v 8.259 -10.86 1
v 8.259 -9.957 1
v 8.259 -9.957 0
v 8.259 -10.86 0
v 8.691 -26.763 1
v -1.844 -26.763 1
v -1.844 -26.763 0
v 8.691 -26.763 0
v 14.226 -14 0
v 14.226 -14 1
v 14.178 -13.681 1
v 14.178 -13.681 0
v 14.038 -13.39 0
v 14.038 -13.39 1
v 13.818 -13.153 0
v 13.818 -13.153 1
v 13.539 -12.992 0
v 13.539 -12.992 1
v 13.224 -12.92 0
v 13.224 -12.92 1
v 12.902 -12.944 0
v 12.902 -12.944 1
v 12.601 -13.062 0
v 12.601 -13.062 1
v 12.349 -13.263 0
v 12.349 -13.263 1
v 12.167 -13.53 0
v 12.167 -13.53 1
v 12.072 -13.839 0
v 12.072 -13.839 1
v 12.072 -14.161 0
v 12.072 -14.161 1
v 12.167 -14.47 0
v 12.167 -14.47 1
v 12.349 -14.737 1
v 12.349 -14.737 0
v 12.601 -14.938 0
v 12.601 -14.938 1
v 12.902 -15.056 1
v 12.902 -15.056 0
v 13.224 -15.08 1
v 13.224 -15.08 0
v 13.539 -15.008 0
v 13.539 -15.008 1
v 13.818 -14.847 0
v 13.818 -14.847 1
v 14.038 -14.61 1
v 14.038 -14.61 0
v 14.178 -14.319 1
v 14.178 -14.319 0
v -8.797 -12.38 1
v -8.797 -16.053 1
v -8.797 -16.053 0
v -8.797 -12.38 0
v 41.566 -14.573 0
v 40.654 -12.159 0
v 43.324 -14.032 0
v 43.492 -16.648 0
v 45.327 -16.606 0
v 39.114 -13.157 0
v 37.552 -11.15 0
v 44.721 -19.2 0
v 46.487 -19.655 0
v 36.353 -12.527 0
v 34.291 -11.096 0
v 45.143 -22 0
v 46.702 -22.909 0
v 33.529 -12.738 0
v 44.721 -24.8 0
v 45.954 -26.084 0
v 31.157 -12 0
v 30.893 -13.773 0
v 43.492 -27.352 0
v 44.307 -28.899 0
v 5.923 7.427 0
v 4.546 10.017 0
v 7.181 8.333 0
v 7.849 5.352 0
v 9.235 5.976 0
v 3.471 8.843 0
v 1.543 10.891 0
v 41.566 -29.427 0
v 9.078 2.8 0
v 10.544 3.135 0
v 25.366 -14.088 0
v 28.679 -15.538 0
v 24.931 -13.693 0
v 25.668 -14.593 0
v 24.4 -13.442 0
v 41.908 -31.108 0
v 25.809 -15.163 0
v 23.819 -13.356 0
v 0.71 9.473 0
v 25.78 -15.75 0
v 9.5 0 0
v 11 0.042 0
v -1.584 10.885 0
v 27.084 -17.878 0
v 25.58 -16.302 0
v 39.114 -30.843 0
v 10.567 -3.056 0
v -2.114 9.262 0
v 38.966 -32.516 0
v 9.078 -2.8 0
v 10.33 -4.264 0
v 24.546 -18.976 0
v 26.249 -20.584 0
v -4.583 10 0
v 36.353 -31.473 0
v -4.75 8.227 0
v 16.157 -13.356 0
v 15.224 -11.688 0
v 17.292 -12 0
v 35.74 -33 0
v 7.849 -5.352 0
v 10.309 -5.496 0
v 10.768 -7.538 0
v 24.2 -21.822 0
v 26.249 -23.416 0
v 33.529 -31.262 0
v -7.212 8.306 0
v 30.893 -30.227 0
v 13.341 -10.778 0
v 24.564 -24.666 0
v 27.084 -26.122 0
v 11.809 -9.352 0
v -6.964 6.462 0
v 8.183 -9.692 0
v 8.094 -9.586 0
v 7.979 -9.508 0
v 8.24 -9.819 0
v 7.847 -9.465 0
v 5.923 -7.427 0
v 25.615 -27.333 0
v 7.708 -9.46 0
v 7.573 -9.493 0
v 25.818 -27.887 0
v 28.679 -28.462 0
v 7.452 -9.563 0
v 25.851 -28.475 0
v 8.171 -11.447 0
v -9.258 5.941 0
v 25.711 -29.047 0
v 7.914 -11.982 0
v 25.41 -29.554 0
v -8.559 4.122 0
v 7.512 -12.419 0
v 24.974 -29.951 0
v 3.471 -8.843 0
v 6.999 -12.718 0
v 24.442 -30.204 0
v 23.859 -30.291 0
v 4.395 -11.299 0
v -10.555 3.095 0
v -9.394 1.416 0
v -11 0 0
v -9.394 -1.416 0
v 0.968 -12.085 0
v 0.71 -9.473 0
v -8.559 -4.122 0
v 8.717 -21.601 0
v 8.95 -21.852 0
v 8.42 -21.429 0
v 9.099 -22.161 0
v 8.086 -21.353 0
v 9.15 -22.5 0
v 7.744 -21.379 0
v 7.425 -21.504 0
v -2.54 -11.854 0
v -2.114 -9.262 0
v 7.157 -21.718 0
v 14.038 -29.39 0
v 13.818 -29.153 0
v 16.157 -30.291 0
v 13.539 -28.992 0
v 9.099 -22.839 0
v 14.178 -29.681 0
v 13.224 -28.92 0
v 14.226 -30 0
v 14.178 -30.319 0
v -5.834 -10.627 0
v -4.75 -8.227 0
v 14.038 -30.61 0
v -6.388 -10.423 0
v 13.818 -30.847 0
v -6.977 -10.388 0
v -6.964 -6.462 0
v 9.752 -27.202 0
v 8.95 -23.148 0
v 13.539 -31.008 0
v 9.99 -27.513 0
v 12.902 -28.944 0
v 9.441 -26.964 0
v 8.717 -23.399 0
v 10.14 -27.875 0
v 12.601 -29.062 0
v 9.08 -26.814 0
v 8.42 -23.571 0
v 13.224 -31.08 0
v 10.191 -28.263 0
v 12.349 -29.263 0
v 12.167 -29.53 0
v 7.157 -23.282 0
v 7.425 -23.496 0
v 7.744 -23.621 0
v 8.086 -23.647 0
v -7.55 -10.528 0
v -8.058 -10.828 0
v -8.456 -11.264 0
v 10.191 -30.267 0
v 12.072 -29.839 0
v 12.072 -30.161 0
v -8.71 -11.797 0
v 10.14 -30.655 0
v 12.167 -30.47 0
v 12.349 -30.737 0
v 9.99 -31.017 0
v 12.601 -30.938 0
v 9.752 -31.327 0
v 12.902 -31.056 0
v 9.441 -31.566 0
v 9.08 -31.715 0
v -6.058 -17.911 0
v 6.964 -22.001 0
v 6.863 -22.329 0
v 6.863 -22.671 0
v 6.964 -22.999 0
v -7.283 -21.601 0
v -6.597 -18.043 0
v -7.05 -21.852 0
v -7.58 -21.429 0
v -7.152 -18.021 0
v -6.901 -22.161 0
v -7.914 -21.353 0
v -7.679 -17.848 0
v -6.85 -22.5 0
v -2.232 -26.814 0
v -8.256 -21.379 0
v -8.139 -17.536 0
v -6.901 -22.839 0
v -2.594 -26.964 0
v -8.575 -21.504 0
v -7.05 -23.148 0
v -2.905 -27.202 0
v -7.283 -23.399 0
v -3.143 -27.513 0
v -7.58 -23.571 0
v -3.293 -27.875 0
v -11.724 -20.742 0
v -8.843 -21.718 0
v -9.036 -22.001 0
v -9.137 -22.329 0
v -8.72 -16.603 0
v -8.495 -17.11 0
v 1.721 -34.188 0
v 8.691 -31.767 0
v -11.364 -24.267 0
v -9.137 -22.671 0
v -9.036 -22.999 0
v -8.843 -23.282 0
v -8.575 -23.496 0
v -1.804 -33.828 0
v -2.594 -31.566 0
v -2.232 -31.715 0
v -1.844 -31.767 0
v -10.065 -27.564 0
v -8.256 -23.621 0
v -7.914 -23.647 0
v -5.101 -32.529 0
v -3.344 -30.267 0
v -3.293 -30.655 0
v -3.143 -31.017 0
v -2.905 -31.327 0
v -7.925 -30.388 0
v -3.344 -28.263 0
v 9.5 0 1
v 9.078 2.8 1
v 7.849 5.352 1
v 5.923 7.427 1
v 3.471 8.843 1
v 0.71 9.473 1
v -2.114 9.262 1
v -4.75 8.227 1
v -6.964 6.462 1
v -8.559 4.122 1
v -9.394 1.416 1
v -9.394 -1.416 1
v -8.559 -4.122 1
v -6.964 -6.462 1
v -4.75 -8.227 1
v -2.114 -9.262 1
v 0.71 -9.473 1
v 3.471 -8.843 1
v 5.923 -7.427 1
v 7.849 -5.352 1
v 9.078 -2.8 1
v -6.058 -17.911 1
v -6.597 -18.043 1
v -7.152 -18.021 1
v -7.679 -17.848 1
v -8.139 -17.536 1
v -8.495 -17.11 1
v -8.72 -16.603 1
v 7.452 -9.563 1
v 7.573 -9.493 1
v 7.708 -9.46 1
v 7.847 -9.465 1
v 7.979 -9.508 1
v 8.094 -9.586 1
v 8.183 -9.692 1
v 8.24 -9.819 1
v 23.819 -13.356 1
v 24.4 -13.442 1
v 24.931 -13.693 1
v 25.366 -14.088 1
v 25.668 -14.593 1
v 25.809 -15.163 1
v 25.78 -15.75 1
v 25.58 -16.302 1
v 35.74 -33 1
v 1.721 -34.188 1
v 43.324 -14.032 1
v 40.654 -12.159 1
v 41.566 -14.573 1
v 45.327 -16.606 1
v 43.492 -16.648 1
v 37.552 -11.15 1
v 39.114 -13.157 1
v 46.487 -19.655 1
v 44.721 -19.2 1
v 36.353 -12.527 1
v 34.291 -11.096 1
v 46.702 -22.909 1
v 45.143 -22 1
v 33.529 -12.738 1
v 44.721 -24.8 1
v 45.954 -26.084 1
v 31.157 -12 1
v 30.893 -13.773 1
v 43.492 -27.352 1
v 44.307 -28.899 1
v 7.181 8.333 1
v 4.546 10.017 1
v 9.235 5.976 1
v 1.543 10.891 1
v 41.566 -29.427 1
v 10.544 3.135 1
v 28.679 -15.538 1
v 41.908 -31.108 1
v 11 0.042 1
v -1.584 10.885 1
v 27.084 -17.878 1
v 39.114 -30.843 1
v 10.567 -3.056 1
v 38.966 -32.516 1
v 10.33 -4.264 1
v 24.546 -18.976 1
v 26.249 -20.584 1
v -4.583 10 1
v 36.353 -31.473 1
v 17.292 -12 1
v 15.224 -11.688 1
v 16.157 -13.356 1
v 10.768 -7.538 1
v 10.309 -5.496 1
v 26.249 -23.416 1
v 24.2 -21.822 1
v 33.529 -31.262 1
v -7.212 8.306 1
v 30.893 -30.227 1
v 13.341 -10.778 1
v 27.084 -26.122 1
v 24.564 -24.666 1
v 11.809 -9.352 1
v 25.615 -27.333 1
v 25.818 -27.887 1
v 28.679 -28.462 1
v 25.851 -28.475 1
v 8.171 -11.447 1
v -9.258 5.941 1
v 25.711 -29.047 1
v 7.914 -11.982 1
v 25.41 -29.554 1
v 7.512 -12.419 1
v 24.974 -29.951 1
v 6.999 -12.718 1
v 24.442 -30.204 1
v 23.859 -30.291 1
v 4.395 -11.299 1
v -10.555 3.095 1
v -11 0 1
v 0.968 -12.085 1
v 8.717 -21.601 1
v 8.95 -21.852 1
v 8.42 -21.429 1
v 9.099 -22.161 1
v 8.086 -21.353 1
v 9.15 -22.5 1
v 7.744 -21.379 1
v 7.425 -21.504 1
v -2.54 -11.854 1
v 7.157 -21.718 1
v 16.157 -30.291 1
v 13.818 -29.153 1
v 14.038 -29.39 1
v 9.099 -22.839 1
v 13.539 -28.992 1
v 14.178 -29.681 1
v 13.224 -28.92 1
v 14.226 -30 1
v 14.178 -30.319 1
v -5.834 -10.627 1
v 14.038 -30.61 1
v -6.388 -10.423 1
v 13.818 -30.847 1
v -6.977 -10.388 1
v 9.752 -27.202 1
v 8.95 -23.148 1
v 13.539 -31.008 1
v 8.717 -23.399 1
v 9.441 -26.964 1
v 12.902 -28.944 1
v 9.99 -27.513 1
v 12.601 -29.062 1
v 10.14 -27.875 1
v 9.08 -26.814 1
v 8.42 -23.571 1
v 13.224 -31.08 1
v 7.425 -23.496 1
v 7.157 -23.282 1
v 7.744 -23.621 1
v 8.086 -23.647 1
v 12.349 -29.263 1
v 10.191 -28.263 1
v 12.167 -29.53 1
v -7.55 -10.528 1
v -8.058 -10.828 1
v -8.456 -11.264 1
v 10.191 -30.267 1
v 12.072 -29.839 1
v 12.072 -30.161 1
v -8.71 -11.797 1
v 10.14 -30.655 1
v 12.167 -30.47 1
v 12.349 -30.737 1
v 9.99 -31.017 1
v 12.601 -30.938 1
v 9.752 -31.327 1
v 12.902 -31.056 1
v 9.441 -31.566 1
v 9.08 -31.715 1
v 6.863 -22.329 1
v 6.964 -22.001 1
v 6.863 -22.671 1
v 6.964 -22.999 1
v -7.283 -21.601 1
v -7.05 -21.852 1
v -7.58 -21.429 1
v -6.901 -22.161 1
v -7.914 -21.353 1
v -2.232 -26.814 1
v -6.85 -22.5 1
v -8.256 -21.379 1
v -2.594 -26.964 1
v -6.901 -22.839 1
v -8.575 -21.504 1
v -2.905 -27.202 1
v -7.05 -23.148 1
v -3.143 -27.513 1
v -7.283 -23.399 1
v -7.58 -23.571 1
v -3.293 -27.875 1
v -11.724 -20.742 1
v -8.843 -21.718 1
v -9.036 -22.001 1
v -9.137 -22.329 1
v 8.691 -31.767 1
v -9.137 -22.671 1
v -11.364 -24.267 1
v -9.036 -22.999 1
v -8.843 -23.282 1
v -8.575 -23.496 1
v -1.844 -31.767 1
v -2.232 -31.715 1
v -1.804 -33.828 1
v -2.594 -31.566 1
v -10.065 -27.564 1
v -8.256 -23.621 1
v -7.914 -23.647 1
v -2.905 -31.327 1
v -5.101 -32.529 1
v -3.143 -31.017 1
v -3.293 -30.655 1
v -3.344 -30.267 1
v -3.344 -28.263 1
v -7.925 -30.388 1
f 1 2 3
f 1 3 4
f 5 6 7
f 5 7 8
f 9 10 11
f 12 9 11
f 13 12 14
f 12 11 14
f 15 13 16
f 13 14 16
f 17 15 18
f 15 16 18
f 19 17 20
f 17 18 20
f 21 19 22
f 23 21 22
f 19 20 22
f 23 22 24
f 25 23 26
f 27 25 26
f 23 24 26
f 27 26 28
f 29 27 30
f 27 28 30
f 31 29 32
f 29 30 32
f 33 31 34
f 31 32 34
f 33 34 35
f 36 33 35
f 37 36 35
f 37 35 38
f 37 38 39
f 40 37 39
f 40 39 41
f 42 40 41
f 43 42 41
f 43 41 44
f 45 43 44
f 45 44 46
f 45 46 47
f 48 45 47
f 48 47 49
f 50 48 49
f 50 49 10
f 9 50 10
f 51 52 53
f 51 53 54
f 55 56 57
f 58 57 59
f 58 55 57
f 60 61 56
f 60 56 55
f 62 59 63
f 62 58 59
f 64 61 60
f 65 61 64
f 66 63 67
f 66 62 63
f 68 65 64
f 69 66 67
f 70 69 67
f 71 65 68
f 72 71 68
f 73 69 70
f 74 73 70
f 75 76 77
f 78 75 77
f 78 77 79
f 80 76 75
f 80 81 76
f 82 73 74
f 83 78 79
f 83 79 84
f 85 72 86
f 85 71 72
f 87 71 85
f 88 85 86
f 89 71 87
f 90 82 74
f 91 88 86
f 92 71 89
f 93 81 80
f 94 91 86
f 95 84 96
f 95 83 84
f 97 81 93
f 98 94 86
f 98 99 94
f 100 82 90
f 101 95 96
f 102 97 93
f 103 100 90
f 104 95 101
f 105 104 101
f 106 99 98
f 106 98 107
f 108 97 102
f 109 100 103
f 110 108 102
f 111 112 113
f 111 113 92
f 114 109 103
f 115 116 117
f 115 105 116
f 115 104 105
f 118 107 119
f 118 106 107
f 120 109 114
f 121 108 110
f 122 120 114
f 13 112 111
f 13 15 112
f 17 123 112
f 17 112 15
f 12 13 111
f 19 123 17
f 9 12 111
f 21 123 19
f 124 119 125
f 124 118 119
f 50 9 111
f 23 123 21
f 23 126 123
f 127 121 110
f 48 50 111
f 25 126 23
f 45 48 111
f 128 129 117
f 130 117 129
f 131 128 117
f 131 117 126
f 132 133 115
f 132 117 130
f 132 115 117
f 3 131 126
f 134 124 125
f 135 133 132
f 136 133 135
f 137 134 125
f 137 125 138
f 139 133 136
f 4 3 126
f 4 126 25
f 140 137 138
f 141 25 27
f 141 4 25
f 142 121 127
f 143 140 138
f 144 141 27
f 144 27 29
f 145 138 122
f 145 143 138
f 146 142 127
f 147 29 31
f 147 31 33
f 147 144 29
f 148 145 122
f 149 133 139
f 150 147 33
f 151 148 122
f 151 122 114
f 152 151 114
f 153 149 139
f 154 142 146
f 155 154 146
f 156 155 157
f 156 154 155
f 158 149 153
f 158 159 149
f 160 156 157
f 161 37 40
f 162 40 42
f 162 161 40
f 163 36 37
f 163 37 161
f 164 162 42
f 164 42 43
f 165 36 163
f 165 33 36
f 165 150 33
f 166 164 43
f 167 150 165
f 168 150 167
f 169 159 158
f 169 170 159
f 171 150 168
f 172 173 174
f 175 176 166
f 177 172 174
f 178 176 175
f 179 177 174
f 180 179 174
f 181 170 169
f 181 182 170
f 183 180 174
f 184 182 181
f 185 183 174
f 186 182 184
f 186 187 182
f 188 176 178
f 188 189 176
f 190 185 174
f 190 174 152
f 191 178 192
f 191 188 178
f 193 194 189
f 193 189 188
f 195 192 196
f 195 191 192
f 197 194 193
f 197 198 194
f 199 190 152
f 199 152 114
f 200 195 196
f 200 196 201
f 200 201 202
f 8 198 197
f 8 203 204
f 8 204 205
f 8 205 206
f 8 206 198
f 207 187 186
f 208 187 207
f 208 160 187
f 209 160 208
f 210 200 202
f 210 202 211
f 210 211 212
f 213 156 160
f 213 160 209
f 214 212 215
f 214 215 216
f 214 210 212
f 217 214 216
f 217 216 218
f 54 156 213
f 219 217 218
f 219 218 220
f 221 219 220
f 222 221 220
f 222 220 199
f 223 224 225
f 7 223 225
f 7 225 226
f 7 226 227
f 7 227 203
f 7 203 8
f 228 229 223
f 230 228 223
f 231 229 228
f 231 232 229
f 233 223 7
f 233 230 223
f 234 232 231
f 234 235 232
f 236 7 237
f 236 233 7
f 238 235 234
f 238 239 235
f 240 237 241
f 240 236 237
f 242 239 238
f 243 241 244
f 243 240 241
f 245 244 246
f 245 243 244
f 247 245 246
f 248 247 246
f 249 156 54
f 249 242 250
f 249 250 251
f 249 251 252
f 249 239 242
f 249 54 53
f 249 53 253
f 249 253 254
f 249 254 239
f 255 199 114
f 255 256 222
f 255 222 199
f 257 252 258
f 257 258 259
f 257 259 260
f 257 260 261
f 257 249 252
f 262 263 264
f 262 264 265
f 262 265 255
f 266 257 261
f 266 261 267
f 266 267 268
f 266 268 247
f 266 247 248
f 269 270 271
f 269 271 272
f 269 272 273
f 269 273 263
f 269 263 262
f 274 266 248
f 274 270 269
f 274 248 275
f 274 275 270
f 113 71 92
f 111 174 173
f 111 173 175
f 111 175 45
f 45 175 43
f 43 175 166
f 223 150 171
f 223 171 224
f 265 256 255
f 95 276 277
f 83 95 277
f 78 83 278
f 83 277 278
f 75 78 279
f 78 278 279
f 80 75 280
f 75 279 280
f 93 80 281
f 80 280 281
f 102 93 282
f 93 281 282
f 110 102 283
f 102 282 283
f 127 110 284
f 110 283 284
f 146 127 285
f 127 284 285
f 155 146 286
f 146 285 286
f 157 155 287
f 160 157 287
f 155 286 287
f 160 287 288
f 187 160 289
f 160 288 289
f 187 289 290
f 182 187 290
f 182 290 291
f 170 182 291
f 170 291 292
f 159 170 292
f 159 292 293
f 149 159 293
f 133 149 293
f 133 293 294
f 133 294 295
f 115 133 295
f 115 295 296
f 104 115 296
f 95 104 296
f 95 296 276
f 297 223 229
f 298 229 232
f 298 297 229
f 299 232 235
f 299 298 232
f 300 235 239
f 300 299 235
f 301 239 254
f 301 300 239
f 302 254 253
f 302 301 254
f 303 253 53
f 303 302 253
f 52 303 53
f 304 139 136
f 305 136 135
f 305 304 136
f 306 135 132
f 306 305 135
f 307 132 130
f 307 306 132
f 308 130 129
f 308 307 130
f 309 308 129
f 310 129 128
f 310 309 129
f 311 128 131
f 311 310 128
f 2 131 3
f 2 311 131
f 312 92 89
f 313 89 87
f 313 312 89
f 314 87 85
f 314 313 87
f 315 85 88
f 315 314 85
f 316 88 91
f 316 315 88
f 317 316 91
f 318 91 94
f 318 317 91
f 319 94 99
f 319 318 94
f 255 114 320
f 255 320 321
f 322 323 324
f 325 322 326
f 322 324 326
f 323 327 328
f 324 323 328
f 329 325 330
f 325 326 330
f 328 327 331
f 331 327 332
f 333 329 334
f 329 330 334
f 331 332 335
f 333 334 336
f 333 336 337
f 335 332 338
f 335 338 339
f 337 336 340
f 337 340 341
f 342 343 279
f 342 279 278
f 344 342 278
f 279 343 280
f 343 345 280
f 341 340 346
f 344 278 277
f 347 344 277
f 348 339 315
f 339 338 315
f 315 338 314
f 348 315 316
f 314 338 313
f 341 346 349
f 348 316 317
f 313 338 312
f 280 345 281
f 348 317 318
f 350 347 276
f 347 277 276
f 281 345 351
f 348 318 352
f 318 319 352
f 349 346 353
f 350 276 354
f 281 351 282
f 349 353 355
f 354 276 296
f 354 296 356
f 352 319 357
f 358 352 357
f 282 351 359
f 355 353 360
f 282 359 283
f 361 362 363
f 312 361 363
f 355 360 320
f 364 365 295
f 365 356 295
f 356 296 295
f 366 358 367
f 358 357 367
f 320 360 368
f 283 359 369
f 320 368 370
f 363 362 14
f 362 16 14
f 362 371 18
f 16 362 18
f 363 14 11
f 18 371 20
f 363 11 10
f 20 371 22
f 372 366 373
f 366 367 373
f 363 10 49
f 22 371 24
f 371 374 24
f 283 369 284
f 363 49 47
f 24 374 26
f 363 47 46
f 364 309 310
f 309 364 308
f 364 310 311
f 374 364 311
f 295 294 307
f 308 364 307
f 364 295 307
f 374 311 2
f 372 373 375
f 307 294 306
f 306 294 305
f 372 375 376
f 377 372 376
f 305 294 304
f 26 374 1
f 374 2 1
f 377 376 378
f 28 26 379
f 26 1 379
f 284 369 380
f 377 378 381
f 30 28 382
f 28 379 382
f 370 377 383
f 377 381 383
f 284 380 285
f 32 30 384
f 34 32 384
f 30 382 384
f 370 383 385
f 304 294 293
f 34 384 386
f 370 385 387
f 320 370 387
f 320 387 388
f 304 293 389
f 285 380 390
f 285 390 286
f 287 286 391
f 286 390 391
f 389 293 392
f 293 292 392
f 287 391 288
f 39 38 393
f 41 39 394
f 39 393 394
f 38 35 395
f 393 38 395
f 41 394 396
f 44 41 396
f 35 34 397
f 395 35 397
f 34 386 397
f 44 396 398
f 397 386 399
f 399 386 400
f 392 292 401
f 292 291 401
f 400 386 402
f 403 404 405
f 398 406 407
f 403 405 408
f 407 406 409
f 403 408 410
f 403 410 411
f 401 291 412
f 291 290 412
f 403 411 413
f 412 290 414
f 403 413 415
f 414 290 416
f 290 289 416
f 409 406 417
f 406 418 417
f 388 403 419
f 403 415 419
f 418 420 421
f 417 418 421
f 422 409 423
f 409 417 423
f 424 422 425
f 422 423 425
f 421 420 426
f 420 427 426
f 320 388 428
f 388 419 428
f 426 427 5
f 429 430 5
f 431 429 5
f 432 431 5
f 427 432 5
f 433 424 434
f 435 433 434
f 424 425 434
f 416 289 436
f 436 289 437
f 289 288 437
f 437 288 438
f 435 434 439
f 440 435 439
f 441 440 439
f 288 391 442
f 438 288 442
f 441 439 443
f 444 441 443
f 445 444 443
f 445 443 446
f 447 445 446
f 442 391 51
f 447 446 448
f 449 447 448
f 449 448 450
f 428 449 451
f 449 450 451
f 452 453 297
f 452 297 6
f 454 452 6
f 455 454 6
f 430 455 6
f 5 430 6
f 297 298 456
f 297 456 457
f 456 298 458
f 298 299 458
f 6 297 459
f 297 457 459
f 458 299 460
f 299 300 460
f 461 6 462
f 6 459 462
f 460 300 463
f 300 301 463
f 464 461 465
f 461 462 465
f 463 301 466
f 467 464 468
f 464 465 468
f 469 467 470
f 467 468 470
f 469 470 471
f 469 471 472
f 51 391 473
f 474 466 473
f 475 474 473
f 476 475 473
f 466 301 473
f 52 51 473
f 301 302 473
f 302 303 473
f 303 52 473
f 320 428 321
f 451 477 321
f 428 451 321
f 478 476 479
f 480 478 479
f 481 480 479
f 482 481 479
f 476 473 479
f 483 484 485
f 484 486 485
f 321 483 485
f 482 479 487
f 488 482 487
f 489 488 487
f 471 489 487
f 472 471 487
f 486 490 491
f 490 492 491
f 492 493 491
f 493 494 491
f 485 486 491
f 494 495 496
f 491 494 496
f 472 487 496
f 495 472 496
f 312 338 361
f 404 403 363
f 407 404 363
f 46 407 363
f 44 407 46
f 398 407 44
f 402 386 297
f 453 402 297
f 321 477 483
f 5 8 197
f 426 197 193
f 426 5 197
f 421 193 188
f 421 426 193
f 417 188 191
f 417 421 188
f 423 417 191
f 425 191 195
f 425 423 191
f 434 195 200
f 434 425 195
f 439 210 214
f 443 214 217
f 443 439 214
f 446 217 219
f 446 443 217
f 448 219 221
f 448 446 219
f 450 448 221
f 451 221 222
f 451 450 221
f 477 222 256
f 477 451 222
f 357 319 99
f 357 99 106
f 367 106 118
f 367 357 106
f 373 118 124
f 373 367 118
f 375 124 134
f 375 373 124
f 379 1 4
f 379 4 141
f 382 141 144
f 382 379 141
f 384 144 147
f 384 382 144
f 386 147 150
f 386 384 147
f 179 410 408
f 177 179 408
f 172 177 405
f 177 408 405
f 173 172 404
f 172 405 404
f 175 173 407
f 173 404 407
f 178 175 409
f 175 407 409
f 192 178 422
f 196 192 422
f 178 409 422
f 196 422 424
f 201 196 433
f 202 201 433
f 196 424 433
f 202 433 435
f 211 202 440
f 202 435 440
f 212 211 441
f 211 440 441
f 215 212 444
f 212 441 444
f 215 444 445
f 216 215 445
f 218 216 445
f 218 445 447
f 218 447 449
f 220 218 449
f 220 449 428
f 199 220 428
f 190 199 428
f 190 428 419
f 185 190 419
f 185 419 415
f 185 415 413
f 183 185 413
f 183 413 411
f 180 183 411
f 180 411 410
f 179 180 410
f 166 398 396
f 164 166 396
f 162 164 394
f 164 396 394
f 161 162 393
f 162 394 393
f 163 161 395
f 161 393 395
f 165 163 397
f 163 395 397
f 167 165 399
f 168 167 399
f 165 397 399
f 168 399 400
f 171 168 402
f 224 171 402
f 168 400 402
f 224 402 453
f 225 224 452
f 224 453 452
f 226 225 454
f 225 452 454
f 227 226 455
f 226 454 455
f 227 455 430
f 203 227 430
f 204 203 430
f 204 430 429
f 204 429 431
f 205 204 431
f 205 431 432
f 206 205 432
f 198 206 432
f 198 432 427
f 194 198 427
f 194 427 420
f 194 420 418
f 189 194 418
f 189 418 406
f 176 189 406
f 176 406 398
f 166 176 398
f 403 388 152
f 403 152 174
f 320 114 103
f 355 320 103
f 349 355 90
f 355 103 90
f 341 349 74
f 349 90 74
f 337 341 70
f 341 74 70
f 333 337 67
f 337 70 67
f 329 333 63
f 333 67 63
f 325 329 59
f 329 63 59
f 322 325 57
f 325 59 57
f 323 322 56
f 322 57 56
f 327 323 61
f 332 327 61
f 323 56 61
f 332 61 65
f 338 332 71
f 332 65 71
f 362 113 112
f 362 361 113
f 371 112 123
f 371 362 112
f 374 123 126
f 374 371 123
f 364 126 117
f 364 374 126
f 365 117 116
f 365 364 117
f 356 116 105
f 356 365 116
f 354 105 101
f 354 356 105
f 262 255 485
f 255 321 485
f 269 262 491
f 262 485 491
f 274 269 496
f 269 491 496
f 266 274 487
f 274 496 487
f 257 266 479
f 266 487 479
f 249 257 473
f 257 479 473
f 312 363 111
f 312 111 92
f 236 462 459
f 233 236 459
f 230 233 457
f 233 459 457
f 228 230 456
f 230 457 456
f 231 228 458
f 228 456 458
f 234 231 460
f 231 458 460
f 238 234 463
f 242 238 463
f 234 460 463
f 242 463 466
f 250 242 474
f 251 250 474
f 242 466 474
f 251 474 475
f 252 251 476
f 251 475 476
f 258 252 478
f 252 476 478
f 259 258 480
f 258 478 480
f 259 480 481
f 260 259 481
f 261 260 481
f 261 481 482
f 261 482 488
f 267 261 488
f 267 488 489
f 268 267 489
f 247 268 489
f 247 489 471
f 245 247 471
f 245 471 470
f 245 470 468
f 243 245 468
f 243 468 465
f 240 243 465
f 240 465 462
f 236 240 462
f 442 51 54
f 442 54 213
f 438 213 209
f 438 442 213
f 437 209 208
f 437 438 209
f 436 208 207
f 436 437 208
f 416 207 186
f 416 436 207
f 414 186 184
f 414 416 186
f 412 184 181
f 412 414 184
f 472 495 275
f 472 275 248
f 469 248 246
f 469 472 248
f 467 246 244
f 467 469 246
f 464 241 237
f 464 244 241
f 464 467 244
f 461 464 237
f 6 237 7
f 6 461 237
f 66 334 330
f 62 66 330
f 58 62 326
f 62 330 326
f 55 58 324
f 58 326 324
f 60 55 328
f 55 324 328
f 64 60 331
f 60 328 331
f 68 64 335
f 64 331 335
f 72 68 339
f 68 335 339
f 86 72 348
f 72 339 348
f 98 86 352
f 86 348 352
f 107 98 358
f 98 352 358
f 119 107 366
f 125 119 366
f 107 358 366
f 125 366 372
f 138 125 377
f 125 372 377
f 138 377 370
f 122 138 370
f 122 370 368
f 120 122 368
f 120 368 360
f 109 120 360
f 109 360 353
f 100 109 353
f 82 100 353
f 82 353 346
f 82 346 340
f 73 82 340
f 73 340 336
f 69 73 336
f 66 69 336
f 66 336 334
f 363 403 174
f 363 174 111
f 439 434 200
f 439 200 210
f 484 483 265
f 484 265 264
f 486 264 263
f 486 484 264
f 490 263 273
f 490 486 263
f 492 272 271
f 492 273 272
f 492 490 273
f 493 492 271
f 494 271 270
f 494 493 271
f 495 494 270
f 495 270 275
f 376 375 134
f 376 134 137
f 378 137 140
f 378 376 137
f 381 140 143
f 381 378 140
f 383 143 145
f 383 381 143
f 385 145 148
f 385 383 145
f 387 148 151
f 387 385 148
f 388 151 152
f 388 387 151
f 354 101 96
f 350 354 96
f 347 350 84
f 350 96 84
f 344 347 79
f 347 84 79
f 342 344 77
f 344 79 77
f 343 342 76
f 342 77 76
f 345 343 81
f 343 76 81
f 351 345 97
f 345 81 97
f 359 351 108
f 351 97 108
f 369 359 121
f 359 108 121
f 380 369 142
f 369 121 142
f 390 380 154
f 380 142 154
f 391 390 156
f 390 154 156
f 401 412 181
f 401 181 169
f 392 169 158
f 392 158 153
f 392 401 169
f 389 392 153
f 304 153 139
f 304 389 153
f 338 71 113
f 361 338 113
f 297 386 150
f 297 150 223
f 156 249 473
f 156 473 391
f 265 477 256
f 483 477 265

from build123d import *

# Parameters (mm, degrees)
SKETCH_3_R          = 9.5
EXTRUDE_1_DEPTH     = 1
EXTRUDE_START       = -1
EXTRUDE_2_DEPTH     = 1
FILLET_2_R          = 13
SKETCH_5_R          = 1.15
CUT_EXTRUDE_1_DEPTH = 58.922235489
SKETCH_6_R          = 9.5
CUT_EXTRUDE_2_DEPTH = 58.922235489
FILLET_3_R          = 8
FILLET_4_R          = 7
SKETCH_7_R          = 1.08334678
CUT_EXTRUDE_4_DEPTH = 10
CUT_EXTRUDE_5_DEPTH = 10


with BuildPart() as part:
    # 草图3 → 凸台-拉伸1 (new body)
    with BuildSketch(Plane.XY):
        with BuildLine():
            Line((-11, 0), (-11, -33))
            Line((-11, -33), (35.74, -33))
            ThreePointArc((35.74, -33), (46.48709263, -19.65479212), (31.157424305, -12))
            Line((31.157424305, -12), (9, -12))
            Line((9, -12), (9, -6.32455532))
            ThreePointArc((9, -6.32455532), (3.31662479, 10.488088482), (-11, 0))
        make_face()
        Circle(SKETCH_3_R, mode=Mode.SUBTRACT)
        with Locations((35.74, -22)):
            Circle(SKETCH_3_R, mode=Mode.SUBTRACT)
    extrude(amount=EXTRUDE_1_DEPTH)

    # 草图4 → 凸台-拉伸2 (add)
    with BuildSketch(Plane.XY.offset(1).offset(EXTRUDE_START)):
        with BuildLine():
            Line((35.74, -33), (-12.210859555, -34.674480913))
            Line((-12.210859555, -34.674480913), (-11, 0))
            ThreePointArc((-11, 0), (3.31662479, 10.488088482), (9, -6.32455532))
            Line((9, -6.32455532), (9, -12))
            Line((9, -12), (31.157424305, -12))
            ThreePointArc((31.157424305, -12), (46.48709263, -19.65479212), (35.74, -33))
        make_face()
    extrude(amount=EXTRUDE_2_DEPTH)

    # 圆角2
    fillet_2_edges = [part.edges().sort_by_distance(p)[0] for p in [
        (-12.210859555, -34.674480913, 0.5),
    ]]
    fillet(fillet_2_edges, radius=FILLET_2_R)

    # 草图5 → 切除-拉伸1 (cut, through all)
    with BuildSketch(Plane.XY.offset(1)):
        with Locations((-8, -22.5)):
            Circle(SKETCH_5_R)
        with Locations((8, -22.5)):
            Circle(SKETCH_5_R)
    extrude(amount=-CUT_EXTRUDE_1_DEPTH, mode=Mode.SUBTRACT)

    # 草图6 → 切除-拉伸2 (cut, through all)
    with BuildSketch(Plane.XY.offset(1)):
        Circle(SKETCH_6_R)
        with Locations((35.642814002, -22)):
            Circle(SKETCH_6_R)
    extrude(amount=-CUT_EXTRUDE_2_DEPTH, mode=Mode.SUBTRACT)

    # 圆角3
    # the kernel refuses this fillet: 8 mm, written as the material it adds along each edge
    with BuildSketch(Plane(origin=(9, -12, 0), x_dir=(0, 1, 0), z_dir=(0, 0, 1))) as fillet_3_piece_1:
        with BuildLine():
            CenterArc((8, -7.654831322), FILLET_3_R, 106.89204914, 73.10795086)
            Line((0, -7.654831322), (-0.16, -7.654831322))
            Line((-0.16, -7.654831322), (-0.16, 0))
            Line((-0.16, 0), (0, 0.16))
            ThreePointArc((0, 0.16), (2.83772234, 0.16), (5.628953573, 0.153096626))
            Line((5.628953573, 0.153096626), (5.67544468, 0))
        make_face()
    extrude(amount=1)

    # 圆角4
    fillet_4_edges = [part.edges().sort_by_distance(p)[0] for p in [
        (9, -6.32455532, 0.5),
    ]]
    fillet(fillet_4_edges, radius=FILLET_4_R)

    # 草图7 → 切除-拉伸4 (cut)
    with BuildSketch(Plane.XY.offset(1)):
        with Locations((13.142814002, -14)):
            Circle(SKETCH_7_R)
        with Locations((13.142814002, -30)):
            Circle(SKETCH_7_R)
    extrude(amount=-CUT_EXTRUDE_4_DEPTH, mode=Mode.SUBTRACT)

    # 草图8 → 切除-拉伸5 (cut)
    with BuildSketch(Plane.XY.offset(1)):
        with BuildLine():
            Line((16.157202734, -30.291096898), (16.157202734, -13.355657228))
            Line((16.157202734, -13.355657228), (23.81874567, -13.355657228))
            ThreePointArc((23.81874567, -13.355657228), (25.535376674, -14.32941262), (25.580428982, -16.302479233))
            ThreePointArc((25.580428982, -16.302479233), (24.200275644, -21.822246327), (25.614952461, -27.333266333))
            ThreePointArc((25.614952461, -27.333266333), (25.579064672, -29.3119639), (23.859230214, -30.291096898))
            Line((23.859230214, -30.291096898), (16.157202734, -30.291096898))
        make_face()
        with BuildLine():
            Line((-1.844212644, -26.7628803), (8.691309214, -26.7628803))
            ThreePointArc((8.691309214, -26.7628803), (9.751969386, -27.202220128), (10.191309214, -28.2628803))
            Line((10.191309214, -28.2628803), (10.191309214, -30.26653293))
            ThreePointArc((10.191309214, -30.26653293), (9.751969386, -31.327193102), (8.691309214, -31.76653293))
            Line((8.691309214, -31.76653293), (-1.844212644, -31.76653293))
            ThreePointArc((-1.844212644, -31.76653293), (-2.904872816, -31.327193102), (-3.344212644, -30.26653293))
            Line((-3.344212644, -30.26653293), (-3.344212644, -28.2628803))
            ThreePointArc((-3.344212644, -28.2628803), (-2.904872816, -27.202220128), (-1.844212644, -26.7628803))
        make_face()
        with BuildLine():
            Line((-8.796911022, -16.052867786), (-8.796911022, -12.380312846))
            ThreePointArc((-8.796911022, -12.380312846), (-7.815486406, -10.659120182), (-5.834406834, -10.627148368))
            ThreePointArc((-5.834406834, -10.627148368), (0.968228408, -12.084664633), (7.452020697, -9.562634212))
            ThreePointArc((7.452020697, -9.562634212), (7.978826228, -9.507761331), (8.259361329, -9.957022011))
            Line((8.259361329, -9.957022011), (8.259361329, -10.859557769))
            ThreePointArc((8.259361329, -10.859557769), (7.914413338, -11.982412545), (6.99855848, -12.717940822))
            Line((6.99855848, -12.717940822), (-6.057713871, -17.911250839))
            ThreePointArc((-6.057713871, -17.911250839), (-7.919765799, -17.707919794), (-8.796911022, -16.052867786))
        make_face()
    extrude(amount=-CUT_EXTRUDE_5_DEPTH, mode=Mode.SUBTRACT)


solid = part.part
